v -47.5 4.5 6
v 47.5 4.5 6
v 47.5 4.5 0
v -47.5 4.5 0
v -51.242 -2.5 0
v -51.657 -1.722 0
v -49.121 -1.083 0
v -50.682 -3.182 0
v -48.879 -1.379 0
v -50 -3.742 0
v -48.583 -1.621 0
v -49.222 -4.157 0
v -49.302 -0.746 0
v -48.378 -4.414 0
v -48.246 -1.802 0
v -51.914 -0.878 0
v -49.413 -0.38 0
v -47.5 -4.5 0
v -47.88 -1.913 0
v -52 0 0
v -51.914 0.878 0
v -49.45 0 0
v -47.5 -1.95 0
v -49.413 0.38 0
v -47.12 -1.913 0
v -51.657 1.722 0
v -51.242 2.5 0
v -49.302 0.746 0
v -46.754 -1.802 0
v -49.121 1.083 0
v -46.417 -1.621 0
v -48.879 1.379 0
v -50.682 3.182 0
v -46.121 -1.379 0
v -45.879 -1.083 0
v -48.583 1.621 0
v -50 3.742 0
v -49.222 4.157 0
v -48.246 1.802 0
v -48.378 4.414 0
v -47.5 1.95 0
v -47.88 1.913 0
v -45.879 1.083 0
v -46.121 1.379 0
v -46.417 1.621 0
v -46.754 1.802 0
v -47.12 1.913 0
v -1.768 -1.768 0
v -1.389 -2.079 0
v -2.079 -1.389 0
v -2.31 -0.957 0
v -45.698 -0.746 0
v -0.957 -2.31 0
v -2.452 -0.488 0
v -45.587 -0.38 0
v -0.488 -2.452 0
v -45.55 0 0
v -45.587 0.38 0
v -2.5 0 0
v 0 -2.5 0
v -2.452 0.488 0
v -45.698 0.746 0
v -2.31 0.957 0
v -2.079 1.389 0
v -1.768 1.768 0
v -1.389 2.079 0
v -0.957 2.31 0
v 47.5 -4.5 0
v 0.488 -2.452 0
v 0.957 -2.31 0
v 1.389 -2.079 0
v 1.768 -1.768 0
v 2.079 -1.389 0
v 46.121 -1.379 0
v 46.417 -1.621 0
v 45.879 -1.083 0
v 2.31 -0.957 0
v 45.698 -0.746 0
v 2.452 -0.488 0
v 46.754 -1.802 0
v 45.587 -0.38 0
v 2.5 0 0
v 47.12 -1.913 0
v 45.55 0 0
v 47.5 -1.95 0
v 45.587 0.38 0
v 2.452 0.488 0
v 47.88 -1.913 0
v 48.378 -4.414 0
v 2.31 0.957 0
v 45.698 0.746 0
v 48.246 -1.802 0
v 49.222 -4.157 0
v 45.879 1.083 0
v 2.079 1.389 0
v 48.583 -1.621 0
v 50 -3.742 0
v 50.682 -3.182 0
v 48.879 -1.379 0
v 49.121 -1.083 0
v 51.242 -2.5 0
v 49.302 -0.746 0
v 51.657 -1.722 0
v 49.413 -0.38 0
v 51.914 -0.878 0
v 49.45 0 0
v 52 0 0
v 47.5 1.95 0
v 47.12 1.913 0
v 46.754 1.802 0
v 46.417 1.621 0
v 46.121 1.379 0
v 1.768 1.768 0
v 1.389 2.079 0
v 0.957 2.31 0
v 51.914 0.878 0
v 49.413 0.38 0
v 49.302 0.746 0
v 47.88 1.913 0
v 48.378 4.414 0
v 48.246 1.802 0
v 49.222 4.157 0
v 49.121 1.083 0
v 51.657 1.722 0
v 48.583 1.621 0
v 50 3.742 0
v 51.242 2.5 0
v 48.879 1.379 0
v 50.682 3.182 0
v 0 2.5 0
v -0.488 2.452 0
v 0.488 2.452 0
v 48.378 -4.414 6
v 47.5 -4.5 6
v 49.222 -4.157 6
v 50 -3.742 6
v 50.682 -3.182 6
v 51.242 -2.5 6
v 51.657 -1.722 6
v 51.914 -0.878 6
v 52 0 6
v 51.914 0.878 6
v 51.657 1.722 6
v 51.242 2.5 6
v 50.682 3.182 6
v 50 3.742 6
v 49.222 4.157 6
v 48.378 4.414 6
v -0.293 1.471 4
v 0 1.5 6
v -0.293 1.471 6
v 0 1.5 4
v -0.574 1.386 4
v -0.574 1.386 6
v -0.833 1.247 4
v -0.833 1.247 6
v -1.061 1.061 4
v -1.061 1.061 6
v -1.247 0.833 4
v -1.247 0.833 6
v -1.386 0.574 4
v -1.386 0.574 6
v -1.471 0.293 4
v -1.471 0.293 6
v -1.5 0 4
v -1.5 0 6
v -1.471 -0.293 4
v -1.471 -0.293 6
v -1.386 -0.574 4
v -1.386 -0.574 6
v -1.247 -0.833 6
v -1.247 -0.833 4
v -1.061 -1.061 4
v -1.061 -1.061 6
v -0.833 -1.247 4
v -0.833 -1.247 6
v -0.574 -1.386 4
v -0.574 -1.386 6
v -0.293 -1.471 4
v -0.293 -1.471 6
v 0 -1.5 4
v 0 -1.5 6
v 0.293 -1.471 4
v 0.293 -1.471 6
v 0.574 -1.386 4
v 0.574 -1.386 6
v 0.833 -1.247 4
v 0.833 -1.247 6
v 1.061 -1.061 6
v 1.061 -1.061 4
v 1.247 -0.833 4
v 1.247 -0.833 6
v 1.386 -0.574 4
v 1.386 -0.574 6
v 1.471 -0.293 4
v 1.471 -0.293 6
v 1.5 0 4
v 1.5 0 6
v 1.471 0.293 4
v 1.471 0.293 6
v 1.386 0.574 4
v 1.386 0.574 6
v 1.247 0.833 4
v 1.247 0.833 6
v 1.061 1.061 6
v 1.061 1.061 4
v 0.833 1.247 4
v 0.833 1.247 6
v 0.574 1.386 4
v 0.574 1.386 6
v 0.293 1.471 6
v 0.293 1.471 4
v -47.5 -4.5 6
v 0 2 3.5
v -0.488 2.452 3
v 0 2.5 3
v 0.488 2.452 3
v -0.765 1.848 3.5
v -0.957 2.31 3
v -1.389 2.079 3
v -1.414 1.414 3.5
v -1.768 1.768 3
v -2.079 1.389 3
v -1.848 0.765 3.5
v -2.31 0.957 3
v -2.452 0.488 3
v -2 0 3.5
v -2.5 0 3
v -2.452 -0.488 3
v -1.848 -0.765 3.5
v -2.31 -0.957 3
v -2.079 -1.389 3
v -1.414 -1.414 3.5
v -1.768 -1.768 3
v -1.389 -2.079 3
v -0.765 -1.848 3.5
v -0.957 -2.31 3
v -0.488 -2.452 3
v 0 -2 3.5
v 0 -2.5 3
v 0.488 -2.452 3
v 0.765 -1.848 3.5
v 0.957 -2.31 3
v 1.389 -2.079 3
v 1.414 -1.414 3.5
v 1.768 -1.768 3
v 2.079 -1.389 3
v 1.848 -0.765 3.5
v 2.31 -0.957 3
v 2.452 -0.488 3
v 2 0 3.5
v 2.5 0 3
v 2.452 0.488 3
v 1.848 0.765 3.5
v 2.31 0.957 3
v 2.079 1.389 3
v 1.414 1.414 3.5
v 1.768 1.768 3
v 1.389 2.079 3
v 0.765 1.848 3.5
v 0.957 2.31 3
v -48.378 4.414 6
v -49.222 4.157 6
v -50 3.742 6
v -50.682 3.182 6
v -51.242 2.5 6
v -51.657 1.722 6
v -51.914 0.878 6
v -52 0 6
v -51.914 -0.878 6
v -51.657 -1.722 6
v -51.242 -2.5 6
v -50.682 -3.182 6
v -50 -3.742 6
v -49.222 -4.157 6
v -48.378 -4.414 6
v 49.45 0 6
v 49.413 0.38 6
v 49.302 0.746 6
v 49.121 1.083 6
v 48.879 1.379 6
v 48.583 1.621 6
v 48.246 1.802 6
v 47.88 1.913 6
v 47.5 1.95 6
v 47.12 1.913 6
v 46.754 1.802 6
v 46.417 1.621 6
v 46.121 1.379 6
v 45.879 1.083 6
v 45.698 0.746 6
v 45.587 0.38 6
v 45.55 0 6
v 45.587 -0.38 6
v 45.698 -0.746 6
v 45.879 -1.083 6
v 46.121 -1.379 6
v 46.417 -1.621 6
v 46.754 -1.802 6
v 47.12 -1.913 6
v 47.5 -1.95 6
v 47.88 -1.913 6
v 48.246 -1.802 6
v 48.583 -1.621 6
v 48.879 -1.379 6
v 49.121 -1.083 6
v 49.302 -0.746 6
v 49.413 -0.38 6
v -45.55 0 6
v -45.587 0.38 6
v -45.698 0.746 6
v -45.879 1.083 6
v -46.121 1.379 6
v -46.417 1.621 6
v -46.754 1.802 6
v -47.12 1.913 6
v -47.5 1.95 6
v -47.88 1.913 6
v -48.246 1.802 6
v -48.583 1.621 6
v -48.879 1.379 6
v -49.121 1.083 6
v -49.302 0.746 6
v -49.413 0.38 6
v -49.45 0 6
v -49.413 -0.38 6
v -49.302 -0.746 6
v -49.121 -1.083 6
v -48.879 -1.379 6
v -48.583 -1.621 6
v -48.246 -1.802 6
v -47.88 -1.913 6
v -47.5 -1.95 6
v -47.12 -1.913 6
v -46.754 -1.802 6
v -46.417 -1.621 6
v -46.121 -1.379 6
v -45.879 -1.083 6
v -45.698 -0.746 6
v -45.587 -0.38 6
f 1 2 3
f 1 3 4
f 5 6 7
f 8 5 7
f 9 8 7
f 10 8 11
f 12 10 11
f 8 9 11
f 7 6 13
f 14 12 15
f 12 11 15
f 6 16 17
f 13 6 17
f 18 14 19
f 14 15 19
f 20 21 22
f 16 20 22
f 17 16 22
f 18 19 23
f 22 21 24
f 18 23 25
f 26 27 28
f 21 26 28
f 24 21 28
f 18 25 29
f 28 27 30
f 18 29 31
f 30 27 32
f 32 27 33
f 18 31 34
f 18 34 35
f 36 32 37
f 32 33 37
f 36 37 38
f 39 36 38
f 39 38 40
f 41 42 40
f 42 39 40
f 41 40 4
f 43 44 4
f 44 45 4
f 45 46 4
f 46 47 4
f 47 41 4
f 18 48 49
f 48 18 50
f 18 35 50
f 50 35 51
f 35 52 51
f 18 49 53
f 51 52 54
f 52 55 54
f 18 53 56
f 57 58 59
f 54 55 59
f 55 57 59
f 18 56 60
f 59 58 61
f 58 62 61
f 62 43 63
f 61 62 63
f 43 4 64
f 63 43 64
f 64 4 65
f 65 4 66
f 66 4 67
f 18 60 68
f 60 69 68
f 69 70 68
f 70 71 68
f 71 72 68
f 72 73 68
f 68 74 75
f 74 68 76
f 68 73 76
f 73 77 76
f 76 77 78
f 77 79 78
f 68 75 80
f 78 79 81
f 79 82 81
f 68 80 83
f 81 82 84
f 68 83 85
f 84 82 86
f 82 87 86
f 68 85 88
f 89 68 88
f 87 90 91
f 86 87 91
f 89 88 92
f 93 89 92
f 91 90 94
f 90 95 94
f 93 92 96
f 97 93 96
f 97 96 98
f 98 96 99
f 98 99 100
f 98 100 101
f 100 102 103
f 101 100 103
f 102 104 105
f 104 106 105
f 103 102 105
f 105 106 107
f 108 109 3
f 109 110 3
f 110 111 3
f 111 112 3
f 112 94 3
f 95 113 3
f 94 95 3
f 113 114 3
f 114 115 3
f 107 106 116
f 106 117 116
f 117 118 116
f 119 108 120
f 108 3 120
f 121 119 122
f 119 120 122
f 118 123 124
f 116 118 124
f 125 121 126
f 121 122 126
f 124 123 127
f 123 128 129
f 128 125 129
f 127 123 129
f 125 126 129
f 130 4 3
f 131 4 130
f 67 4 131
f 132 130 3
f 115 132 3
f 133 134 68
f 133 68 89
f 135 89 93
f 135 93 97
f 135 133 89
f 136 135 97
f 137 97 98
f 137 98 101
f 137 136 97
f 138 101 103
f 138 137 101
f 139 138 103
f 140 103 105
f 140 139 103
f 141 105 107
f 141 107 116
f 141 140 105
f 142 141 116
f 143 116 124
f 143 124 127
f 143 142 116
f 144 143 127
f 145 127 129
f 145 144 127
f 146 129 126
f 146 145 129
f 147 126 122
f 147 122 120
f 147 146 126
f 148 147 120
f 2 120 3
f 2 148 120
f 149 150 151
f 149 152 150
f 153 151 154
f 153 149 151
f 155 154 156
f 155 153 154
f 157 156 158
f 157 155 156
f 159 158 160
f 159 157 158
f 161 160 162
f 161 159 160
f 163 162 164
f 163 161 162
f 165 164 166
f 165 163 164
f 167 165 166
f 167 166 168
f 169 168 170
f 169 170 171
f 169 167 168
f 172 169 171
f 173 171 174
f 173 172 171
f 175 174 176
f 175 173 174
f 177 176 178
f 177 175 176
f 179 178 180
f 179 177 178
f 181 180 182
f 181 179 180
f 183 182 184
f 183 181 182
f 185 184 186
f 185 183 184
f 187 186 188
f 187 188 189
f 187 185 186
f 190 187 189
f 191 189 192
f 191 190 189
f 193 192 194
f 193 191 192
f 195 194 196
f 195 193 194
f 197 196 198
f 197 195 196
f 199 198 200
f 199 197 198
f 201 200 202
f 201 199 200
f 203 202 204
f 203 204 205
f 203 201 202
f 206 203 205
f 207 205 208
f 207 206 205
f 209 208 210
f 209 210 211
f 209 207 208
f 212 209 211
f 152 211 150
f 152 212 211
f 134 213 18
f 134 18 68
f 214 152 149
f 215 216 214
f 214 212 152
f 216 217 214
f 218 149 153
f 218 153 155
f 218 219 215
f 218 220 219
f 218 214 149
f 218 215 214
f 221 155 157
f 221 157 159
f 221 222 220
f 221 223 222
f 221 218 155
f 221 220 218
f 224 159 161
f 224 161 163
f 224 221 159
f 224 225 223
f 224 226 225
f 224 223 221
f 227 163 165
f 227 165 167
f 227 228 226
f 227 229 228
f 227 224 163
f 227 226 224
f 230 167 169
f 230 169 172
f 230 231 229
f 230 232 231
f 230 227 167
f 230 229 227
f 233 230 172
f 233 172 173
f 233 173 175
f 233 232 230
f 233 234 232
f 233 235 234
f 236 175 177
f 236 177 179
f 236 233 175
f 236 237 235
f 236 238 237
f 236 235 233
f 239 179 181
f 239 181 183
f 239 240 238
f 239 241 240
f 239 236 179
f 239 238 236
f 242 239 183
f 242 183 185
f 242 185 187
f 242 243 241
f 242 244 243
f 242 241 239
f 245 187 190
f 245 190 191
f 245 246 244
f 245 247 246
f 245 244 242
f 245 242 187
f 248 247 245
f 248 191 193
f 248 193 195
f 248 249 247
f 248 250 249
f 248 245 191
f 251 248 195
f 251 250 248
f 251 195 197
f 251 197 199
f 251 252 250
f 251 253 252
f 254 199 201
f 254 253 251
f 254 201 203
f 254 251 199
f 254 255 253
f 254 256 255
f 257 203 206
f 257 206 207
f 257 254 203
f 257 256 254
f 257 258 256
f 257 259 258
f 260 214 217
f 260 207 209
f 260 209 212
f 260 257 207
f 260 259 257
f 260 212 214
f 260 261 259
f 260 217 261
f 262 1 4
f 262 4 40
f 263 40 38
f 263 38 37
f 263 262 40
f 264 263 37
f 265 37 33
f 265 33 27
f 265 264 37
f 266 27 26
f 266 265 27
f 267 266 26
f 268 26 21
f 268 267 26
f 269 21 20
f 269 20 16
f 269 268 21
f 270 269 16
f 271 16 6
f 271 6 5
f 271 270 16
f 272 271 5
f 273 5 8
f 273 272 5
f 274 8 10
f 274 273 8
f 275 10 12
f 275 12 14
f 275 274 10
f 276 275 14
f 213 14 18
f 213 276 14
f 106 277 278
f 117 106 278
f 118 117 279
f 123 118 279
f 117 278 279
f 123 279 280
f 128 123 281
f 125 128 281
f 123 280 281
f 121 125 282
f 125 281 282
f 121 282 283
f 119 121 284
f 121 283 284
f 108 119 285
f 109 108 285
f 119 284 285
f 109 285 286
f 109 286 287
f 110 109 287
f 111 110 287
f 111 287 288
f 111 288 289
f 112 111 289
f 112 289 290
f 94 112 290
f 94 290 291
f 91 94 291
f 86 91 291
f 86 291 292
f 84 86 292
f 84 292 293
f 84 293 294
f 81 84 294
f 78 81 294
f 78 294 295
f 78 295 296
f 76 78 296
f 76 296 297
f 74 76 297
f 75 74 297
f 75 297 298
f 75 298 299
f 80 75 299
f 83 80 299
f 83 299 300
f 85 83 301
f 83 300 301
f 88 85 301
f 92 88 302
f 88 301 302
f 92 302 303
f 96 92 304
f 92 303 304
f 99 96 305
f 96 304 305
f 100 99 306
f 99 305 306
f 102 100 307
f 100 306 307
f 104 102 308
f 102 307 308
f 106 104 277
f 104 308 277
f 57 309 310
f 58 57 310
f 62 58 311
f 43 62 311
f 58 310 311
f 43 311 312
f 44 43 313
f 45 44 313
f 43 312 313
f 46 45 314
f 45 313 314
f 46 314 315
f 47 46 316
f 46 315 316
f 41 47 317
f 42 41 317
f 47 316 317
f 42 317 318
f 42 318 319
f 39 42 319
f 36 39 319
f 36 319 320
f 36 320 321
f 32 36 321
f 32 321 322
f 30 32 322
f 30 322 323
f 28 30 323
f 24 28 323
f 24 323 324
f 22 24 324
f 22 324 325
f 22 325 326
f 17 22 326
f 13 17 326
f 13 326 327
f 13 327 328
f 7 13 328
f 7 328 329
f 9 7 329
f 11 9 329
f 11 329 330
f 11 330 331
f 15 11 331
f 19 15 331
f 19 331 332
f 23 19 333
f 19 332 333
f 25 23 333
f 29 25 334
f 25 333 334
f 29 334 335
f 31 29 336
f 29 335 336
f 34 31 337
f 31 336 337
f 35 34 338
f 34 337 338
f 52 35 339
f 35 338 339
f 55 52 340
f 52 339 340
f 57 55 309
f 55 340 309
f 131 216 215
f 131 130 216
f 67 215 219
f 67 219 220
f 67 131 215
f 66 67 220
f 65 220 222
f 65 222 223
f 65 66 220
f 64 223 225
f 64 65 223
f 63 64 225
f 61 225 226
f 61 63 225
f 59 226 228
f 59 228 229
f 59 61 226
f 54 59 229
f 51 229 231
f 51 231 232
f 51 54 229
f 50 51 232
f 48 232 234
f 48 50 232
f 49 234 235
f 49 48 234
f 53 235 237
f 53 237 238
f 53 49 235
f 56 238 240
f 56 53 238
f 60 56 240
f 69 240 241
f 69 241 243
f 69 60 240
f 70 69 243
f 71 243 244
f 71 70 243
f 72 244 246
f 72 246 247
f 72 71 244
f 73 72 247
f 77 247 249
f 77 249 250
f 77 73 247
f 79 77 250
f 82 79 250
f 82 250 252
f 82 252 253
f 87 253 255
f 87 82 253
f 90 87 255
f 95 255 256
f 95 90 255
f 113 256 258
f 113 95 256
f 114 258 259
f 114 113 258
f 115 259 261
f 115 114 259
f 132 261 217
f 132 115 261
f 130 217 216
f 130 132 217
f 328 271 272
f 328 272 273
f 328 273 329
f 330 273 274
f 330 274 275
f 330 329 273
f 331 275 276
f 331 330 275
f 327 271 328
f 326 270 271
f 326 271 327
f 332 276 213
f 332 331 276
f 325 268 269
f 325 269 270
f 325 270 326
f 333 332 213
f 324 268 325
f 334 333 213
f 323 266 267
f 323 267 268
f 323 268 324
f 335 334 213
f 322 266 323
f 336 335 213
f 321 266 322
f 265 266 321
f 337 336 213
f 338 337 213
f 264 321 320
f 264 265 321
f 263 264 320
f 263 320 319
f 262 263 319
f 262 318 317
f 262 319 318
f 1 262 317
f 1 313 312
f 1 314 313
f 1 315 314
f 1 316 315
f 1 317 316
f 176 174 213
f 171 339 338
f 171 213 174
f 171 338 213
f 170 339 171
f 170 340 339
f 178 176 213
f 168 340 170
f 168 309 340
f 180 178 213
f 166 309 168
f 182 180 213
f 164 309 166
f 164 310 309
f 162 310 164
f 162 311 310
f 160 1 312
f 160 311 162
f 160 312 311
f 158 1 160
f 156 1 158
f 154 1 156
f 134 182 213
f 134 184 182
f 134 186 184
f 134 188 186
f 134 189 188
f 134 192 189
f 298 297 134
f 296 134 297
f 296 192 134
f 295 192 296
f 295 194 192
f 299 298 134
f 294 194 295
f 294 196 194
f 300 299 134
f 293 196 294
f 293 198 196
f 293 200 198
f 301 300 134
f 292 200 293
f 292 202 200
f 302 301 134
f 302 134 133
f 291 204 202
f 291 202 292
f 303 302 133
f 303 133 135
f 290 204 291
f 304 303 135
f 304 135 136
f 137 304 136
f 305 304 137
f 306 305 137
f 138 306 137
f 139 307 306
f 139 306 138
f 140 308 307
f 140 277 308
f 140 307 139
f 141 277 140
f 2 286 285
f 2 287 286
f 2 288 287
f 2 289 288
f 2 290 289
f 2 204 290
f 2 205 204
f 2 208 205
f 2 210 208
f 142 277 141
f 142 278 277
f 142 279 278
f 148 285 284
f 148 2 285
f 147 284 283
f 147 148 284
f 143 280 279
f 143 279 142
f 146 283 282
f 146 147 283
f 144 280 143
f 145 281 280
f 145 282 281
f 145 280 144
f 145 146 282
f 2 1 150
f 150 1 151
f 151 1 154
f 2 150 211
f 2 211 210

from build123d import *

# Parameters (mm, degrees)
BOSS_EXTRUDE1_DEPTH        = 6
F_3_9_3_9_DIAMETER_HOLE1_D = 3.9


with BuildPart() as part:
    # Sketch1 → Boss-Extrude1 (new body)
    with BuildSketch(Plane.XY.offset(6)):
        with BuildLine():
            Line((47.5, 4.5), (-47.5, 4.5))
            ThreePointArc((-47.5, 4.5), (-52, 0), (-47.5, -4.5))
            Line((-47.5, -4.5), (47.5, -4.5))
            ThreePointArc((47.5, -4.5), (52, 0), (47.5, 4.5))
        make_face()
    extrude(amount=-BOSS_EXTRUDE1_DEPTH)

    # Ø3.9 (3.9) Diameter Hole1 (through all)
    with Locations(Plane(origin=(0, 0, 0), x_dir=(-1, 0, 0), z_dir=(0, 0, -1))):
        with Locations((47.5, 0), (-47.5, 0)):
            Hole(F_3_9_3_9_DIAMETER_HOLE1_D / 2)

    # Sketch4 → CSK for M2.5 Flat Head Machine Screw1 (revolve, cut)
    with BuildSketch(Plane.YZ):
        Polygon((0, 0), (0, 6), (1.5, 6), (1.5, 4), (2.5, 3), (2.5, 0), align=None)
    revolve(axis=Axis((0, 0, -6.35), (0, 0, 1)), mode=Mode.SUBTRACT)


solid = part.part
